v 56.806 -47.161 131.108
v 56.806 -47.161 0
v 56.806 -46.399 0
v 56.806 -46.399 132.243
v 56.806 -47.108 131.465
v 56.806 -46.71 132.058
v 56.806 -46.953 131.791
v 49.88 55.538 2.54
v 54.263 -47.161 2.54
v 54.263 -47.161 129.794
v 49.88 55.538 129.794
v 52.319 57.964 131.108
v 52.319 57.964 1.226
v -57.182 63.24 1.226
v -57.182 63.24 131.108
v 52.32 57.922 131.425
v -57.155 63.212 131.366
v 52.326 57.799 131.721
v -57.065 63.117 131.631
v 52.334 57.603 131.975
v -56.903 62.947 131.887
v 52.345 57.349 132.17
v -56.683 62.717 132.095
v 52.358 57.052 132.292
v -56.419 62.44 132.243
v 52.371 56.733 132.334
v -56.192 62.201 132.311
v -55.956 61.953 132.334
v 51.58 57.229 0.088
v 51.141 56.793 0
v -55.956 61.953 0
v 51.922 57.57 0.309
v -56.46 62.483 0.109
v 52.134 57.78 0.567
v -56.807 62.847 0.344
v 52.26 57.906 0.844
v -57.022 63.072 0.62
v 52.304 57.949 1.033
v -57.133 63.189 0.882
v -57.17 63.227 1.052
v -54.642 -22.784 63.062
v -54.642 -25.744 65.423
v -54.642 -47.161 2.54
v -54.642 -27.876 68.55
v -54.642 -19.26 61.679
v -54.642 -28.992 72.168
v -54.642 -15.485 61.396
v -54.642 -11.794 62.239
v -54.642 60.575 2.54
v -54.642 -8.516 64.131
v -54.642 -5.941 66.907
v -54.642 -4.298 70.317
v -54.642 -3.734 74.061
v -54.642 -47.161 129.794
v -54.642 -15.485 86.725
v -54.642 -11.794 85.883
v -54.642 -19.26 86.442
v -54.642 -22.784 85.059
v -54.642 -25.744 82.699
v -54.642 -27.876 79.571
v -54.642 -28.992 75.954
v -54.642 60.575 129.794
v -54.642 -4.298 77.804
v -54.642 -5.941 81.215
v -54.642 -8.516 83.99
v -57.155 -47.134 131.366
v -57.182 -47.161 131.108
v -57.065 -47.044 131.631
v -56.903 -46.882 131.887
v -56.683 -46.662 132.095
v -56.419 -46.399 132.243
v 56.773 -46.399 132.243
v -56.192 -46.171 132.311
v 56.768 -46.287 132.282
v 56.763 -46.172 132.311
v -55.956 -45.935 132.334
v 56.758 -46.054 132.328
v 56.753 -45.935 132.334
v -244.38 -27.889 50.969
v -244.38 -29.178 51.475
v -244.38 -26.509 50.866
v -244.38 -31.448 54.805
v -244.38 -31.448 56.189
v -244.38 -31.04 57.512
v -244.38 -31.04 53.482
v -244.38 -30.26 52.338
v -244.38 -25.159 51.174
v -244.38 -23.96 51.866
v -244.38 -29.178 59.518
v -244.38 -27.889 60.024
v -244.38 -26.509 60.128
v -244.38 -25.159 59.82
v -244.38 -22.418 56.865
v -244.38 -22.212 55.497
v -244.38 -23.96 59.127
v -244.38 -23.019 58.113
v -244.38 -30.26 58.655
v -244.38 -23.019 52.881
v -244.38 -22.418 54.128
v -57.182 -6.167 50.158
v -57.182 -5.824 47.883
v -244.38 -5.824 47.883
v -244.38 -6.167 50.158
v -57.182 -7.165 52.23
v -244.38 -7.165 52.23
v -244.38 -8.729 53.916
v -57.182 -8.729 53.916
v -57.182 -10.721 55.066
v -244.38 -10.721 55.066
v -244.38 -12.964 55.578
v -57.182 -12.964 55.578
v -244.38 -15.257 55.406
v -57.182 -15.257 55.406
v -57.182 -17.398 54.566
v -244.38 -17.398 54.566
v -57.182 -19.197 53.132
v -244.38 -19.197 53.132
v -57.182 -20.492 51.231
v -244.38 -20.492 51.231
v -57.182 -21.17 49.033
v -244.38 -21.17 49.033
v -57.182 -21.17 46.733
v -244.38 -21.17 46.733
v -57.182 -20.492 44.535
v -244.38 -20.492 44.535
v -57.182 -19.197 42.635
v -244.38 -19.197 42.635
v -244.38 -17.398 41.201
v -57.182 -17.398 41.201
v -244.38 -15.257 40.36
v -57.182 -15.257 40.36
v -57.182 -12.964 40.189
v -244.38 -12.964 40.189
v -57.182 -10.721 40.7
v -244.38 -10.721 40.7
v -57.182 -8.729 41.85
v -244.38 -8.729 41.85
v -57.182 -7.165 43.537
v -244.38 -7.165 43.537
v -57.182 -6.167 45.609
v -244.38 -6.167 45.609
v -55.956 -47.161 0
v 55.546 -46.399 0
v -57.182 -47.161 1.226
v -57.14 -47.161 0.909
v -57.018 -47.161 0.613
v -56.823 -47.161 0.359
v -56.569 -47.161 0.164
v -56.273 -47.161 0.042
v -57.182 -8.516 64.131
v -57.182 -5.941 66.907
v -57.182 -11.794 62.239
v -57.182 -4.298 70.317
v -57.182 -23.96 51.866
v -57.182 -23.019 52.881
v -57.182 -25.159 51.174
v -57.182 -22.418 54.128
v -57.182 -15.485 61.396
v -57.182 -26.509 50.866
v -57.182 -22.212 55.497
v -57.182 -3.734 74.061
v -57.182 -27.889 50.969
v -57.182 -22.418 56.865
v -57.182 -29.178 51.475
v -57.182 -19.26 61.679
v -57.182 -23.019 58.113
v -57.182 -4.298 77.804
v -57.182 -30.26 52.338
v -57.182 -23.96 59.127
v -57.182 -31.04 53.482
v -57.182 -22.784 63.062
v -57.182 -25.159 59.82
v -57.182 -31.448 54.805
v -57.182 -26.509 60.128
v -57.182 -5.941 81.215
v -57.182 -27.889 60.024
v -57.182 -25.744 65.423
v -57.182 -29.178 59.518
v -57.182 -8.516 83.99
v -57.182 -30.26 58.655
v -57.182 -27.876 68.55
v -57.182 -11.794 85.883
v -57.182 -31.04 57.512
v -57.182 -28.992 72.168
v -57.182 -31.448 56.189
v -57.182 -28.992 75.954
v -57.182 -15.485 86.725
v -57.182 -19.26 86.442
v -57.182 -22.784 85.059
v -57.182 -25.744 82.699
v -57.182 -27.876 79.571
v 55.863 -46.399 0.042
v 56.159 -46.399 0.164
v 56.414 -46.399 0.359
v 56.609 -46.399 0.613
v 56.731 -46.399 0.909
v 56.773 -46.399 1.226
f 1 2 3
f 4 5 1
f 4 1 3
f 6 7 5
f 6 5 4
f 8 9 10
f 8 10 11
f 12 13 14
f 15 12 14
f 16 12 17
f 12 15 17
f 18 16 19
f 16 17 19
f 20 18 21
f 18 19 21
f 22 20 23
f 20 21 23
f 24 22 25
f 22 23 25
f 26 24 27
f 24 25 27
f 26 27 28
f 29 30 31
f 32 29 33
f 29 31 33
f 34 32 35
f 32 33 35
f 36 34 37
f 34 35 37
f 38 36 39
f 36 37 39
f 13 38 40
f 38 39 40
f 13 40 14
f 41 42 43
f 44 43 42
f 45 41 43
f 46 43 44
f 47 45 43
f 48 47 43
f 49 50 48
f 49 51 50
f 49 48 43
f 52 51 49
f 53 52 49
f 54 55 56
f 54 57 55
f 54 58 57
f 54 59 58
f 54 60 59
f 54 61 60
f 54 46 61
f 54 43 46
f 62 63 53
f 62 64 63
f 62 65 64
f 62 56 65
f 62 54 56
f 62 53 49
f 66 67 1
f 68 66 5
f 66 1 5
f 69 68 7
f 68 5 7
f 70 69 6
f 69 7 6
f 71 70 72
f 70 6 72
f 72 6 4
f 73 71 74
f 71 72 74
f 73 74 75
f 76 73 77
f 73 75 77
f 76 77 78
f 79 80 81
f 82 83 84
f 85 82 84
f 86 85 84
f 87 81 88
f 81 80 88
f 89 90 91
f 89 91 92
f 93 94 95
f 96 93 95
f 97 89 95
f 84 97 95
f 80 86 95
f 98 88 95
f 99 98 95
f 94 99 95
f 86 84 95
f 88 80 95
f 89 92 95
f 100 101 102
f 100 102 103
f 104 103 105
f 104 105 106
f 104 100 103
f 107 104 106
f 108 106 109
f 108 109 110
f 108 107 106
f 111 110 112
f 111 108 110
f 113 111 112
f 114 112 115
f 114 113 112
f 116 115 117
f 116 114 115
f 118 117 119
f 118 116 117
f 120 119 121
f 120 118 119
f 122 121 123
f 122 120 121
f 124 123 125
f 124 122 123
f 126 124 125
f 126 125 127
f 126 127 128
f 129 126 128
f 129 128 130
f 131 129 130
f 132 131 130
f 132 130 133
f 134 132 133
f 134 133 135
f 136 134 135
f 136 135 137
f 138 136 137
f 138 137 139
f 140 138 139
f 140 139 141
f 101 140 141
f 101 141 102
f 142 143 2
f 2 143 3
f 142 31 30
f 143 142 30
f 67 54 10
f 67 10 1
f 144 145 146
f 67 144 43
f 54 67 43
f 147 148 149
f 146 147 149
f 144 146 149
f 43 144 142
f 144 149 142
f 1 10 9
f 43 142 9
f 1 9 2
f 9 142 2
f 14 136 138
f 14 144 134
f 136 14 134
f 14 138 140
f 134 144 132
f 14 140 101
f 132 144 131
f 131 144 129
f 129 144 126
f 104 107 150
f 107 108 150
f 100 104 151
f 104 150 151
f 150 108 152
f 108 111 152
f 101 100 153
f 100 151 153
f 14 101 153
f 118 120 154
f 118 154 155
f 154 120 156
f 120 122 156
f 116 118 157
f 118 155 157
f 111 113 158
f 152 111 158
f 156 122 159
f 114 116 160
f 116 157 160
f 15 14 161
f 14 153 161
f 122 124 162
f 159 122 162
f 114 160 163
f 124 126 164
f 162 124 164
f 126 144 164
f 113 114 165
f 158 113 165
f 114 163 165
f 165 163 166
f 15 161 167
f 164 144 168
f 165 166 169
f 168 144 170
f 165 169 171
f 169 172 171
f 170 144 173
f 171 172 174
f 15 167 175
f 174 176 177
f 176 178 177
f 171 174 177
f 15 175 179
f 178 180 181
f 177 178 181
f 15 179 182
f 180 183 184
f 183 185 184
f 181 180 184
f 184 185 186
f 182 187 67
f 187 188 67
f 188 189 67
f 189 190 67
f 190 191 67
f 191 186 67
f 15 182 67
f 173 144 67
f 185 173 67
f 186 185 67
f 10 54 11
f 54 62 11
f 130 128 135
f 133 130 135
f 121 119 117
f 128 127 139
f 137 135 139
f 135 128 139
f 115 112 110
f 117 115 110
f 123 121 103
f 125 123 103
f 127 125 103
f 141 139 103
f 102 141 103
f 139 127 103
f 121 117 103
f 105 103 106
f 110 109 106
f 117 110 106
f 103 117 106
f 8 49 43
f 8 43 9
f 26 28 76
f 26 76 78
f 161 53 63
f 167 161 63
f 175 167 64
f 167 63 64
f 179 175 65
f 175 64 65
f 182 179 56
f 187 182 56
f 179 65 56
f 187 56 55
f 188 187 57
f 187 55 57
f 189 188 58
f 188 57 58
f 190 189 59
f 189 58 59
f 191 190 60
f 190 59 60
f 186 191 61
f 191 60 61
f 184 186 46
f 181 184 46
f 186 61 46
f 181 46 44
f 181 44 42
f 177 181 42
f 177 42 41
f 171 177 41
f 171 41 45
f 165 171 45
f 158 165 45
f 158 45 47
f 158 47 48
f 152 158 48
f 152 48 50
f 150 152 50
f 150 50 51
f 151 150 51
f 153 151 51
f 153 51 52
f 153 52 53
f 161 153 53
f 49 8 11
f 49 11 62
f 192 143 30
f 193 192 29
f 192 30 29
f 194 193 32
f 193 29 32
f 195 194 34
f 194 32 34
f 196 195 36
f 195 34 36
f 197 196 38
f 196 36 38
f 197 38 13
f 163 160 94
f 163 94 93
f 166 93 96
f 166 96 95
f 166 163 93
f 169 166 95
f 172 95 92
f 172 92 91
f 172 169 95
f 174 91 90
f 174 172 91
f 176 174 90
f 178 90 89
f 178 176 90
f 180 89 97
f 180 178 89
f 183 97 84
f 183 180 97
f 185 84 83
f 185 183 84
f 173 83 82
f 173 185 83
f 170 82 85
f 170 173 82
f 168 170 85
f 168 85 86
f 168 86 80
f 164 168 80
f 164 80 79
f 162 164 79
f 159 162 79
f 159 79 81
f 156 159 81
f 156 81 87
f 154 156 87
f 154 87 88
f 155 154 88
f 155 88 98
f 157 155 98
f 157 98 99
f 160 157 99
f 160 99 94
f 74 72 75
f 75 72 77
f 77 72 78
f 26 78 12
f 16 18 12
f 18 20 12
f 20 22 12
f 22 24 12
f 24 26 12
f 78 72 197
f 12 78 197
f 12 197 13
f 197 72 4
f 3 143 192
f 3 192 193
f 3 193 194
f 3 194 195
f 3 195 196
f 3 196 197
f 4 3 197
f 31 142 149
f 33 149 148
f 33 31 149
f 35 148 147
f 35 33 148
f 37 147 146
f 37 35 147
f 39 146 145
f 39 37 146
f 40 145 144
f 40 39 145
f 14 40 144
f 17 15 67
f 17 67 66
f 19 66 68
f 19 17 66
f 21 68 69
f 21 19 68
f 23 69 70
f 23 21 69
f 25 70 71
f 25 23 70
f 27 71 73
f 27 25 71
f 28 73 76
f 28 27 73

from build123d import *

# Parameters (mm, degrees)
F1_DEPTH  = 132.334
F2_T      = -2.54
F3_DEPTH  = 0.762
F5_D      = 25.4
F5_DEPTH  = 5.08
F5_TIP    = 7.6309298617
F9_R      = 1.2264204897
F7_R      = 7.7162508116
F7_R_2    = 4.6438728955
F10_DEPTH = 189.738


with BuildPart() as f1:
    # F0 (on Top) → F1 (new body)
    with BuildSketch(Plane.XY):
        Polygon((52.318636328, 57.9638108611), (-57.1821704507, 63.2404088974), (-57.1821704507, -47.161385417), (56.8056404591, -47.161385417), align=None)
    extrude(amount=F1_DEPTH)

    # F2
    f2_openings = [f1.faces().sort_by_distance(p)[0] for p in [
        (-0.188265, -47.161385, 66.167),
    ]]
    offset(amount=F2_T, openings=f2_openings)

    # F3 (add): a face of the model
    f3_faces = [f1.faces().sort_by_distance(p)[0] for p in [
        (-55.4355878276, -47.161385417, 66.167),
    ]]
    extrude(f3_faces, amount=-F3_DEPTH)

    # F5 (one way)
    with BuildSketch(Plane.YZ.offset(-54.6421704507)):
        with Locations((-16.4339449257, 74.0607306361)):
            Circle(F5_D / 2)
    extrude(amount=-F5_DEPTH, mode=Mode.SUBTRACT)
    with Locations(Plane.YZ.offset(-54.6421704507)):
        with Locations((-16.4339449257, 74.0607306361)):
            with Locations((0, 0, -(F5_DEPTH + F5_TIP / 2))):  # 118° drill point
                Cone(0, F5_D / 2, F5_TIP, mode=Mode.SUBTRACT)

    # F9
    f9_edges = [f1.edges().sort_by_distance(p)[0] for p in [
        (-57.18217, 8.039512, 132.334),
        (-2.431767, 60.60211, 132.334),
        (-0.188265, -47.161385, 132.334),
        (-57.18217, 8.039512, 0),
        (54.545876, 5.782213, 0),
        (-2.431767, 60.60211, 0),
    ]]
    fillet(f9_edges, radius=F9_R)

    # F7 (on face) → F10 (join)
    with BuildSketch(Plane.YZ.offset(-54.6421704507)):
        with Locations((-13.5401813313, 47.8832386434)):
            Circle(F7_R)
        with Locations((-26.8557239324, 55.4966442287)):
            Circle(F7_R_2)
    extrude(amount=-F10_DEPTH)


solid = f1.part
